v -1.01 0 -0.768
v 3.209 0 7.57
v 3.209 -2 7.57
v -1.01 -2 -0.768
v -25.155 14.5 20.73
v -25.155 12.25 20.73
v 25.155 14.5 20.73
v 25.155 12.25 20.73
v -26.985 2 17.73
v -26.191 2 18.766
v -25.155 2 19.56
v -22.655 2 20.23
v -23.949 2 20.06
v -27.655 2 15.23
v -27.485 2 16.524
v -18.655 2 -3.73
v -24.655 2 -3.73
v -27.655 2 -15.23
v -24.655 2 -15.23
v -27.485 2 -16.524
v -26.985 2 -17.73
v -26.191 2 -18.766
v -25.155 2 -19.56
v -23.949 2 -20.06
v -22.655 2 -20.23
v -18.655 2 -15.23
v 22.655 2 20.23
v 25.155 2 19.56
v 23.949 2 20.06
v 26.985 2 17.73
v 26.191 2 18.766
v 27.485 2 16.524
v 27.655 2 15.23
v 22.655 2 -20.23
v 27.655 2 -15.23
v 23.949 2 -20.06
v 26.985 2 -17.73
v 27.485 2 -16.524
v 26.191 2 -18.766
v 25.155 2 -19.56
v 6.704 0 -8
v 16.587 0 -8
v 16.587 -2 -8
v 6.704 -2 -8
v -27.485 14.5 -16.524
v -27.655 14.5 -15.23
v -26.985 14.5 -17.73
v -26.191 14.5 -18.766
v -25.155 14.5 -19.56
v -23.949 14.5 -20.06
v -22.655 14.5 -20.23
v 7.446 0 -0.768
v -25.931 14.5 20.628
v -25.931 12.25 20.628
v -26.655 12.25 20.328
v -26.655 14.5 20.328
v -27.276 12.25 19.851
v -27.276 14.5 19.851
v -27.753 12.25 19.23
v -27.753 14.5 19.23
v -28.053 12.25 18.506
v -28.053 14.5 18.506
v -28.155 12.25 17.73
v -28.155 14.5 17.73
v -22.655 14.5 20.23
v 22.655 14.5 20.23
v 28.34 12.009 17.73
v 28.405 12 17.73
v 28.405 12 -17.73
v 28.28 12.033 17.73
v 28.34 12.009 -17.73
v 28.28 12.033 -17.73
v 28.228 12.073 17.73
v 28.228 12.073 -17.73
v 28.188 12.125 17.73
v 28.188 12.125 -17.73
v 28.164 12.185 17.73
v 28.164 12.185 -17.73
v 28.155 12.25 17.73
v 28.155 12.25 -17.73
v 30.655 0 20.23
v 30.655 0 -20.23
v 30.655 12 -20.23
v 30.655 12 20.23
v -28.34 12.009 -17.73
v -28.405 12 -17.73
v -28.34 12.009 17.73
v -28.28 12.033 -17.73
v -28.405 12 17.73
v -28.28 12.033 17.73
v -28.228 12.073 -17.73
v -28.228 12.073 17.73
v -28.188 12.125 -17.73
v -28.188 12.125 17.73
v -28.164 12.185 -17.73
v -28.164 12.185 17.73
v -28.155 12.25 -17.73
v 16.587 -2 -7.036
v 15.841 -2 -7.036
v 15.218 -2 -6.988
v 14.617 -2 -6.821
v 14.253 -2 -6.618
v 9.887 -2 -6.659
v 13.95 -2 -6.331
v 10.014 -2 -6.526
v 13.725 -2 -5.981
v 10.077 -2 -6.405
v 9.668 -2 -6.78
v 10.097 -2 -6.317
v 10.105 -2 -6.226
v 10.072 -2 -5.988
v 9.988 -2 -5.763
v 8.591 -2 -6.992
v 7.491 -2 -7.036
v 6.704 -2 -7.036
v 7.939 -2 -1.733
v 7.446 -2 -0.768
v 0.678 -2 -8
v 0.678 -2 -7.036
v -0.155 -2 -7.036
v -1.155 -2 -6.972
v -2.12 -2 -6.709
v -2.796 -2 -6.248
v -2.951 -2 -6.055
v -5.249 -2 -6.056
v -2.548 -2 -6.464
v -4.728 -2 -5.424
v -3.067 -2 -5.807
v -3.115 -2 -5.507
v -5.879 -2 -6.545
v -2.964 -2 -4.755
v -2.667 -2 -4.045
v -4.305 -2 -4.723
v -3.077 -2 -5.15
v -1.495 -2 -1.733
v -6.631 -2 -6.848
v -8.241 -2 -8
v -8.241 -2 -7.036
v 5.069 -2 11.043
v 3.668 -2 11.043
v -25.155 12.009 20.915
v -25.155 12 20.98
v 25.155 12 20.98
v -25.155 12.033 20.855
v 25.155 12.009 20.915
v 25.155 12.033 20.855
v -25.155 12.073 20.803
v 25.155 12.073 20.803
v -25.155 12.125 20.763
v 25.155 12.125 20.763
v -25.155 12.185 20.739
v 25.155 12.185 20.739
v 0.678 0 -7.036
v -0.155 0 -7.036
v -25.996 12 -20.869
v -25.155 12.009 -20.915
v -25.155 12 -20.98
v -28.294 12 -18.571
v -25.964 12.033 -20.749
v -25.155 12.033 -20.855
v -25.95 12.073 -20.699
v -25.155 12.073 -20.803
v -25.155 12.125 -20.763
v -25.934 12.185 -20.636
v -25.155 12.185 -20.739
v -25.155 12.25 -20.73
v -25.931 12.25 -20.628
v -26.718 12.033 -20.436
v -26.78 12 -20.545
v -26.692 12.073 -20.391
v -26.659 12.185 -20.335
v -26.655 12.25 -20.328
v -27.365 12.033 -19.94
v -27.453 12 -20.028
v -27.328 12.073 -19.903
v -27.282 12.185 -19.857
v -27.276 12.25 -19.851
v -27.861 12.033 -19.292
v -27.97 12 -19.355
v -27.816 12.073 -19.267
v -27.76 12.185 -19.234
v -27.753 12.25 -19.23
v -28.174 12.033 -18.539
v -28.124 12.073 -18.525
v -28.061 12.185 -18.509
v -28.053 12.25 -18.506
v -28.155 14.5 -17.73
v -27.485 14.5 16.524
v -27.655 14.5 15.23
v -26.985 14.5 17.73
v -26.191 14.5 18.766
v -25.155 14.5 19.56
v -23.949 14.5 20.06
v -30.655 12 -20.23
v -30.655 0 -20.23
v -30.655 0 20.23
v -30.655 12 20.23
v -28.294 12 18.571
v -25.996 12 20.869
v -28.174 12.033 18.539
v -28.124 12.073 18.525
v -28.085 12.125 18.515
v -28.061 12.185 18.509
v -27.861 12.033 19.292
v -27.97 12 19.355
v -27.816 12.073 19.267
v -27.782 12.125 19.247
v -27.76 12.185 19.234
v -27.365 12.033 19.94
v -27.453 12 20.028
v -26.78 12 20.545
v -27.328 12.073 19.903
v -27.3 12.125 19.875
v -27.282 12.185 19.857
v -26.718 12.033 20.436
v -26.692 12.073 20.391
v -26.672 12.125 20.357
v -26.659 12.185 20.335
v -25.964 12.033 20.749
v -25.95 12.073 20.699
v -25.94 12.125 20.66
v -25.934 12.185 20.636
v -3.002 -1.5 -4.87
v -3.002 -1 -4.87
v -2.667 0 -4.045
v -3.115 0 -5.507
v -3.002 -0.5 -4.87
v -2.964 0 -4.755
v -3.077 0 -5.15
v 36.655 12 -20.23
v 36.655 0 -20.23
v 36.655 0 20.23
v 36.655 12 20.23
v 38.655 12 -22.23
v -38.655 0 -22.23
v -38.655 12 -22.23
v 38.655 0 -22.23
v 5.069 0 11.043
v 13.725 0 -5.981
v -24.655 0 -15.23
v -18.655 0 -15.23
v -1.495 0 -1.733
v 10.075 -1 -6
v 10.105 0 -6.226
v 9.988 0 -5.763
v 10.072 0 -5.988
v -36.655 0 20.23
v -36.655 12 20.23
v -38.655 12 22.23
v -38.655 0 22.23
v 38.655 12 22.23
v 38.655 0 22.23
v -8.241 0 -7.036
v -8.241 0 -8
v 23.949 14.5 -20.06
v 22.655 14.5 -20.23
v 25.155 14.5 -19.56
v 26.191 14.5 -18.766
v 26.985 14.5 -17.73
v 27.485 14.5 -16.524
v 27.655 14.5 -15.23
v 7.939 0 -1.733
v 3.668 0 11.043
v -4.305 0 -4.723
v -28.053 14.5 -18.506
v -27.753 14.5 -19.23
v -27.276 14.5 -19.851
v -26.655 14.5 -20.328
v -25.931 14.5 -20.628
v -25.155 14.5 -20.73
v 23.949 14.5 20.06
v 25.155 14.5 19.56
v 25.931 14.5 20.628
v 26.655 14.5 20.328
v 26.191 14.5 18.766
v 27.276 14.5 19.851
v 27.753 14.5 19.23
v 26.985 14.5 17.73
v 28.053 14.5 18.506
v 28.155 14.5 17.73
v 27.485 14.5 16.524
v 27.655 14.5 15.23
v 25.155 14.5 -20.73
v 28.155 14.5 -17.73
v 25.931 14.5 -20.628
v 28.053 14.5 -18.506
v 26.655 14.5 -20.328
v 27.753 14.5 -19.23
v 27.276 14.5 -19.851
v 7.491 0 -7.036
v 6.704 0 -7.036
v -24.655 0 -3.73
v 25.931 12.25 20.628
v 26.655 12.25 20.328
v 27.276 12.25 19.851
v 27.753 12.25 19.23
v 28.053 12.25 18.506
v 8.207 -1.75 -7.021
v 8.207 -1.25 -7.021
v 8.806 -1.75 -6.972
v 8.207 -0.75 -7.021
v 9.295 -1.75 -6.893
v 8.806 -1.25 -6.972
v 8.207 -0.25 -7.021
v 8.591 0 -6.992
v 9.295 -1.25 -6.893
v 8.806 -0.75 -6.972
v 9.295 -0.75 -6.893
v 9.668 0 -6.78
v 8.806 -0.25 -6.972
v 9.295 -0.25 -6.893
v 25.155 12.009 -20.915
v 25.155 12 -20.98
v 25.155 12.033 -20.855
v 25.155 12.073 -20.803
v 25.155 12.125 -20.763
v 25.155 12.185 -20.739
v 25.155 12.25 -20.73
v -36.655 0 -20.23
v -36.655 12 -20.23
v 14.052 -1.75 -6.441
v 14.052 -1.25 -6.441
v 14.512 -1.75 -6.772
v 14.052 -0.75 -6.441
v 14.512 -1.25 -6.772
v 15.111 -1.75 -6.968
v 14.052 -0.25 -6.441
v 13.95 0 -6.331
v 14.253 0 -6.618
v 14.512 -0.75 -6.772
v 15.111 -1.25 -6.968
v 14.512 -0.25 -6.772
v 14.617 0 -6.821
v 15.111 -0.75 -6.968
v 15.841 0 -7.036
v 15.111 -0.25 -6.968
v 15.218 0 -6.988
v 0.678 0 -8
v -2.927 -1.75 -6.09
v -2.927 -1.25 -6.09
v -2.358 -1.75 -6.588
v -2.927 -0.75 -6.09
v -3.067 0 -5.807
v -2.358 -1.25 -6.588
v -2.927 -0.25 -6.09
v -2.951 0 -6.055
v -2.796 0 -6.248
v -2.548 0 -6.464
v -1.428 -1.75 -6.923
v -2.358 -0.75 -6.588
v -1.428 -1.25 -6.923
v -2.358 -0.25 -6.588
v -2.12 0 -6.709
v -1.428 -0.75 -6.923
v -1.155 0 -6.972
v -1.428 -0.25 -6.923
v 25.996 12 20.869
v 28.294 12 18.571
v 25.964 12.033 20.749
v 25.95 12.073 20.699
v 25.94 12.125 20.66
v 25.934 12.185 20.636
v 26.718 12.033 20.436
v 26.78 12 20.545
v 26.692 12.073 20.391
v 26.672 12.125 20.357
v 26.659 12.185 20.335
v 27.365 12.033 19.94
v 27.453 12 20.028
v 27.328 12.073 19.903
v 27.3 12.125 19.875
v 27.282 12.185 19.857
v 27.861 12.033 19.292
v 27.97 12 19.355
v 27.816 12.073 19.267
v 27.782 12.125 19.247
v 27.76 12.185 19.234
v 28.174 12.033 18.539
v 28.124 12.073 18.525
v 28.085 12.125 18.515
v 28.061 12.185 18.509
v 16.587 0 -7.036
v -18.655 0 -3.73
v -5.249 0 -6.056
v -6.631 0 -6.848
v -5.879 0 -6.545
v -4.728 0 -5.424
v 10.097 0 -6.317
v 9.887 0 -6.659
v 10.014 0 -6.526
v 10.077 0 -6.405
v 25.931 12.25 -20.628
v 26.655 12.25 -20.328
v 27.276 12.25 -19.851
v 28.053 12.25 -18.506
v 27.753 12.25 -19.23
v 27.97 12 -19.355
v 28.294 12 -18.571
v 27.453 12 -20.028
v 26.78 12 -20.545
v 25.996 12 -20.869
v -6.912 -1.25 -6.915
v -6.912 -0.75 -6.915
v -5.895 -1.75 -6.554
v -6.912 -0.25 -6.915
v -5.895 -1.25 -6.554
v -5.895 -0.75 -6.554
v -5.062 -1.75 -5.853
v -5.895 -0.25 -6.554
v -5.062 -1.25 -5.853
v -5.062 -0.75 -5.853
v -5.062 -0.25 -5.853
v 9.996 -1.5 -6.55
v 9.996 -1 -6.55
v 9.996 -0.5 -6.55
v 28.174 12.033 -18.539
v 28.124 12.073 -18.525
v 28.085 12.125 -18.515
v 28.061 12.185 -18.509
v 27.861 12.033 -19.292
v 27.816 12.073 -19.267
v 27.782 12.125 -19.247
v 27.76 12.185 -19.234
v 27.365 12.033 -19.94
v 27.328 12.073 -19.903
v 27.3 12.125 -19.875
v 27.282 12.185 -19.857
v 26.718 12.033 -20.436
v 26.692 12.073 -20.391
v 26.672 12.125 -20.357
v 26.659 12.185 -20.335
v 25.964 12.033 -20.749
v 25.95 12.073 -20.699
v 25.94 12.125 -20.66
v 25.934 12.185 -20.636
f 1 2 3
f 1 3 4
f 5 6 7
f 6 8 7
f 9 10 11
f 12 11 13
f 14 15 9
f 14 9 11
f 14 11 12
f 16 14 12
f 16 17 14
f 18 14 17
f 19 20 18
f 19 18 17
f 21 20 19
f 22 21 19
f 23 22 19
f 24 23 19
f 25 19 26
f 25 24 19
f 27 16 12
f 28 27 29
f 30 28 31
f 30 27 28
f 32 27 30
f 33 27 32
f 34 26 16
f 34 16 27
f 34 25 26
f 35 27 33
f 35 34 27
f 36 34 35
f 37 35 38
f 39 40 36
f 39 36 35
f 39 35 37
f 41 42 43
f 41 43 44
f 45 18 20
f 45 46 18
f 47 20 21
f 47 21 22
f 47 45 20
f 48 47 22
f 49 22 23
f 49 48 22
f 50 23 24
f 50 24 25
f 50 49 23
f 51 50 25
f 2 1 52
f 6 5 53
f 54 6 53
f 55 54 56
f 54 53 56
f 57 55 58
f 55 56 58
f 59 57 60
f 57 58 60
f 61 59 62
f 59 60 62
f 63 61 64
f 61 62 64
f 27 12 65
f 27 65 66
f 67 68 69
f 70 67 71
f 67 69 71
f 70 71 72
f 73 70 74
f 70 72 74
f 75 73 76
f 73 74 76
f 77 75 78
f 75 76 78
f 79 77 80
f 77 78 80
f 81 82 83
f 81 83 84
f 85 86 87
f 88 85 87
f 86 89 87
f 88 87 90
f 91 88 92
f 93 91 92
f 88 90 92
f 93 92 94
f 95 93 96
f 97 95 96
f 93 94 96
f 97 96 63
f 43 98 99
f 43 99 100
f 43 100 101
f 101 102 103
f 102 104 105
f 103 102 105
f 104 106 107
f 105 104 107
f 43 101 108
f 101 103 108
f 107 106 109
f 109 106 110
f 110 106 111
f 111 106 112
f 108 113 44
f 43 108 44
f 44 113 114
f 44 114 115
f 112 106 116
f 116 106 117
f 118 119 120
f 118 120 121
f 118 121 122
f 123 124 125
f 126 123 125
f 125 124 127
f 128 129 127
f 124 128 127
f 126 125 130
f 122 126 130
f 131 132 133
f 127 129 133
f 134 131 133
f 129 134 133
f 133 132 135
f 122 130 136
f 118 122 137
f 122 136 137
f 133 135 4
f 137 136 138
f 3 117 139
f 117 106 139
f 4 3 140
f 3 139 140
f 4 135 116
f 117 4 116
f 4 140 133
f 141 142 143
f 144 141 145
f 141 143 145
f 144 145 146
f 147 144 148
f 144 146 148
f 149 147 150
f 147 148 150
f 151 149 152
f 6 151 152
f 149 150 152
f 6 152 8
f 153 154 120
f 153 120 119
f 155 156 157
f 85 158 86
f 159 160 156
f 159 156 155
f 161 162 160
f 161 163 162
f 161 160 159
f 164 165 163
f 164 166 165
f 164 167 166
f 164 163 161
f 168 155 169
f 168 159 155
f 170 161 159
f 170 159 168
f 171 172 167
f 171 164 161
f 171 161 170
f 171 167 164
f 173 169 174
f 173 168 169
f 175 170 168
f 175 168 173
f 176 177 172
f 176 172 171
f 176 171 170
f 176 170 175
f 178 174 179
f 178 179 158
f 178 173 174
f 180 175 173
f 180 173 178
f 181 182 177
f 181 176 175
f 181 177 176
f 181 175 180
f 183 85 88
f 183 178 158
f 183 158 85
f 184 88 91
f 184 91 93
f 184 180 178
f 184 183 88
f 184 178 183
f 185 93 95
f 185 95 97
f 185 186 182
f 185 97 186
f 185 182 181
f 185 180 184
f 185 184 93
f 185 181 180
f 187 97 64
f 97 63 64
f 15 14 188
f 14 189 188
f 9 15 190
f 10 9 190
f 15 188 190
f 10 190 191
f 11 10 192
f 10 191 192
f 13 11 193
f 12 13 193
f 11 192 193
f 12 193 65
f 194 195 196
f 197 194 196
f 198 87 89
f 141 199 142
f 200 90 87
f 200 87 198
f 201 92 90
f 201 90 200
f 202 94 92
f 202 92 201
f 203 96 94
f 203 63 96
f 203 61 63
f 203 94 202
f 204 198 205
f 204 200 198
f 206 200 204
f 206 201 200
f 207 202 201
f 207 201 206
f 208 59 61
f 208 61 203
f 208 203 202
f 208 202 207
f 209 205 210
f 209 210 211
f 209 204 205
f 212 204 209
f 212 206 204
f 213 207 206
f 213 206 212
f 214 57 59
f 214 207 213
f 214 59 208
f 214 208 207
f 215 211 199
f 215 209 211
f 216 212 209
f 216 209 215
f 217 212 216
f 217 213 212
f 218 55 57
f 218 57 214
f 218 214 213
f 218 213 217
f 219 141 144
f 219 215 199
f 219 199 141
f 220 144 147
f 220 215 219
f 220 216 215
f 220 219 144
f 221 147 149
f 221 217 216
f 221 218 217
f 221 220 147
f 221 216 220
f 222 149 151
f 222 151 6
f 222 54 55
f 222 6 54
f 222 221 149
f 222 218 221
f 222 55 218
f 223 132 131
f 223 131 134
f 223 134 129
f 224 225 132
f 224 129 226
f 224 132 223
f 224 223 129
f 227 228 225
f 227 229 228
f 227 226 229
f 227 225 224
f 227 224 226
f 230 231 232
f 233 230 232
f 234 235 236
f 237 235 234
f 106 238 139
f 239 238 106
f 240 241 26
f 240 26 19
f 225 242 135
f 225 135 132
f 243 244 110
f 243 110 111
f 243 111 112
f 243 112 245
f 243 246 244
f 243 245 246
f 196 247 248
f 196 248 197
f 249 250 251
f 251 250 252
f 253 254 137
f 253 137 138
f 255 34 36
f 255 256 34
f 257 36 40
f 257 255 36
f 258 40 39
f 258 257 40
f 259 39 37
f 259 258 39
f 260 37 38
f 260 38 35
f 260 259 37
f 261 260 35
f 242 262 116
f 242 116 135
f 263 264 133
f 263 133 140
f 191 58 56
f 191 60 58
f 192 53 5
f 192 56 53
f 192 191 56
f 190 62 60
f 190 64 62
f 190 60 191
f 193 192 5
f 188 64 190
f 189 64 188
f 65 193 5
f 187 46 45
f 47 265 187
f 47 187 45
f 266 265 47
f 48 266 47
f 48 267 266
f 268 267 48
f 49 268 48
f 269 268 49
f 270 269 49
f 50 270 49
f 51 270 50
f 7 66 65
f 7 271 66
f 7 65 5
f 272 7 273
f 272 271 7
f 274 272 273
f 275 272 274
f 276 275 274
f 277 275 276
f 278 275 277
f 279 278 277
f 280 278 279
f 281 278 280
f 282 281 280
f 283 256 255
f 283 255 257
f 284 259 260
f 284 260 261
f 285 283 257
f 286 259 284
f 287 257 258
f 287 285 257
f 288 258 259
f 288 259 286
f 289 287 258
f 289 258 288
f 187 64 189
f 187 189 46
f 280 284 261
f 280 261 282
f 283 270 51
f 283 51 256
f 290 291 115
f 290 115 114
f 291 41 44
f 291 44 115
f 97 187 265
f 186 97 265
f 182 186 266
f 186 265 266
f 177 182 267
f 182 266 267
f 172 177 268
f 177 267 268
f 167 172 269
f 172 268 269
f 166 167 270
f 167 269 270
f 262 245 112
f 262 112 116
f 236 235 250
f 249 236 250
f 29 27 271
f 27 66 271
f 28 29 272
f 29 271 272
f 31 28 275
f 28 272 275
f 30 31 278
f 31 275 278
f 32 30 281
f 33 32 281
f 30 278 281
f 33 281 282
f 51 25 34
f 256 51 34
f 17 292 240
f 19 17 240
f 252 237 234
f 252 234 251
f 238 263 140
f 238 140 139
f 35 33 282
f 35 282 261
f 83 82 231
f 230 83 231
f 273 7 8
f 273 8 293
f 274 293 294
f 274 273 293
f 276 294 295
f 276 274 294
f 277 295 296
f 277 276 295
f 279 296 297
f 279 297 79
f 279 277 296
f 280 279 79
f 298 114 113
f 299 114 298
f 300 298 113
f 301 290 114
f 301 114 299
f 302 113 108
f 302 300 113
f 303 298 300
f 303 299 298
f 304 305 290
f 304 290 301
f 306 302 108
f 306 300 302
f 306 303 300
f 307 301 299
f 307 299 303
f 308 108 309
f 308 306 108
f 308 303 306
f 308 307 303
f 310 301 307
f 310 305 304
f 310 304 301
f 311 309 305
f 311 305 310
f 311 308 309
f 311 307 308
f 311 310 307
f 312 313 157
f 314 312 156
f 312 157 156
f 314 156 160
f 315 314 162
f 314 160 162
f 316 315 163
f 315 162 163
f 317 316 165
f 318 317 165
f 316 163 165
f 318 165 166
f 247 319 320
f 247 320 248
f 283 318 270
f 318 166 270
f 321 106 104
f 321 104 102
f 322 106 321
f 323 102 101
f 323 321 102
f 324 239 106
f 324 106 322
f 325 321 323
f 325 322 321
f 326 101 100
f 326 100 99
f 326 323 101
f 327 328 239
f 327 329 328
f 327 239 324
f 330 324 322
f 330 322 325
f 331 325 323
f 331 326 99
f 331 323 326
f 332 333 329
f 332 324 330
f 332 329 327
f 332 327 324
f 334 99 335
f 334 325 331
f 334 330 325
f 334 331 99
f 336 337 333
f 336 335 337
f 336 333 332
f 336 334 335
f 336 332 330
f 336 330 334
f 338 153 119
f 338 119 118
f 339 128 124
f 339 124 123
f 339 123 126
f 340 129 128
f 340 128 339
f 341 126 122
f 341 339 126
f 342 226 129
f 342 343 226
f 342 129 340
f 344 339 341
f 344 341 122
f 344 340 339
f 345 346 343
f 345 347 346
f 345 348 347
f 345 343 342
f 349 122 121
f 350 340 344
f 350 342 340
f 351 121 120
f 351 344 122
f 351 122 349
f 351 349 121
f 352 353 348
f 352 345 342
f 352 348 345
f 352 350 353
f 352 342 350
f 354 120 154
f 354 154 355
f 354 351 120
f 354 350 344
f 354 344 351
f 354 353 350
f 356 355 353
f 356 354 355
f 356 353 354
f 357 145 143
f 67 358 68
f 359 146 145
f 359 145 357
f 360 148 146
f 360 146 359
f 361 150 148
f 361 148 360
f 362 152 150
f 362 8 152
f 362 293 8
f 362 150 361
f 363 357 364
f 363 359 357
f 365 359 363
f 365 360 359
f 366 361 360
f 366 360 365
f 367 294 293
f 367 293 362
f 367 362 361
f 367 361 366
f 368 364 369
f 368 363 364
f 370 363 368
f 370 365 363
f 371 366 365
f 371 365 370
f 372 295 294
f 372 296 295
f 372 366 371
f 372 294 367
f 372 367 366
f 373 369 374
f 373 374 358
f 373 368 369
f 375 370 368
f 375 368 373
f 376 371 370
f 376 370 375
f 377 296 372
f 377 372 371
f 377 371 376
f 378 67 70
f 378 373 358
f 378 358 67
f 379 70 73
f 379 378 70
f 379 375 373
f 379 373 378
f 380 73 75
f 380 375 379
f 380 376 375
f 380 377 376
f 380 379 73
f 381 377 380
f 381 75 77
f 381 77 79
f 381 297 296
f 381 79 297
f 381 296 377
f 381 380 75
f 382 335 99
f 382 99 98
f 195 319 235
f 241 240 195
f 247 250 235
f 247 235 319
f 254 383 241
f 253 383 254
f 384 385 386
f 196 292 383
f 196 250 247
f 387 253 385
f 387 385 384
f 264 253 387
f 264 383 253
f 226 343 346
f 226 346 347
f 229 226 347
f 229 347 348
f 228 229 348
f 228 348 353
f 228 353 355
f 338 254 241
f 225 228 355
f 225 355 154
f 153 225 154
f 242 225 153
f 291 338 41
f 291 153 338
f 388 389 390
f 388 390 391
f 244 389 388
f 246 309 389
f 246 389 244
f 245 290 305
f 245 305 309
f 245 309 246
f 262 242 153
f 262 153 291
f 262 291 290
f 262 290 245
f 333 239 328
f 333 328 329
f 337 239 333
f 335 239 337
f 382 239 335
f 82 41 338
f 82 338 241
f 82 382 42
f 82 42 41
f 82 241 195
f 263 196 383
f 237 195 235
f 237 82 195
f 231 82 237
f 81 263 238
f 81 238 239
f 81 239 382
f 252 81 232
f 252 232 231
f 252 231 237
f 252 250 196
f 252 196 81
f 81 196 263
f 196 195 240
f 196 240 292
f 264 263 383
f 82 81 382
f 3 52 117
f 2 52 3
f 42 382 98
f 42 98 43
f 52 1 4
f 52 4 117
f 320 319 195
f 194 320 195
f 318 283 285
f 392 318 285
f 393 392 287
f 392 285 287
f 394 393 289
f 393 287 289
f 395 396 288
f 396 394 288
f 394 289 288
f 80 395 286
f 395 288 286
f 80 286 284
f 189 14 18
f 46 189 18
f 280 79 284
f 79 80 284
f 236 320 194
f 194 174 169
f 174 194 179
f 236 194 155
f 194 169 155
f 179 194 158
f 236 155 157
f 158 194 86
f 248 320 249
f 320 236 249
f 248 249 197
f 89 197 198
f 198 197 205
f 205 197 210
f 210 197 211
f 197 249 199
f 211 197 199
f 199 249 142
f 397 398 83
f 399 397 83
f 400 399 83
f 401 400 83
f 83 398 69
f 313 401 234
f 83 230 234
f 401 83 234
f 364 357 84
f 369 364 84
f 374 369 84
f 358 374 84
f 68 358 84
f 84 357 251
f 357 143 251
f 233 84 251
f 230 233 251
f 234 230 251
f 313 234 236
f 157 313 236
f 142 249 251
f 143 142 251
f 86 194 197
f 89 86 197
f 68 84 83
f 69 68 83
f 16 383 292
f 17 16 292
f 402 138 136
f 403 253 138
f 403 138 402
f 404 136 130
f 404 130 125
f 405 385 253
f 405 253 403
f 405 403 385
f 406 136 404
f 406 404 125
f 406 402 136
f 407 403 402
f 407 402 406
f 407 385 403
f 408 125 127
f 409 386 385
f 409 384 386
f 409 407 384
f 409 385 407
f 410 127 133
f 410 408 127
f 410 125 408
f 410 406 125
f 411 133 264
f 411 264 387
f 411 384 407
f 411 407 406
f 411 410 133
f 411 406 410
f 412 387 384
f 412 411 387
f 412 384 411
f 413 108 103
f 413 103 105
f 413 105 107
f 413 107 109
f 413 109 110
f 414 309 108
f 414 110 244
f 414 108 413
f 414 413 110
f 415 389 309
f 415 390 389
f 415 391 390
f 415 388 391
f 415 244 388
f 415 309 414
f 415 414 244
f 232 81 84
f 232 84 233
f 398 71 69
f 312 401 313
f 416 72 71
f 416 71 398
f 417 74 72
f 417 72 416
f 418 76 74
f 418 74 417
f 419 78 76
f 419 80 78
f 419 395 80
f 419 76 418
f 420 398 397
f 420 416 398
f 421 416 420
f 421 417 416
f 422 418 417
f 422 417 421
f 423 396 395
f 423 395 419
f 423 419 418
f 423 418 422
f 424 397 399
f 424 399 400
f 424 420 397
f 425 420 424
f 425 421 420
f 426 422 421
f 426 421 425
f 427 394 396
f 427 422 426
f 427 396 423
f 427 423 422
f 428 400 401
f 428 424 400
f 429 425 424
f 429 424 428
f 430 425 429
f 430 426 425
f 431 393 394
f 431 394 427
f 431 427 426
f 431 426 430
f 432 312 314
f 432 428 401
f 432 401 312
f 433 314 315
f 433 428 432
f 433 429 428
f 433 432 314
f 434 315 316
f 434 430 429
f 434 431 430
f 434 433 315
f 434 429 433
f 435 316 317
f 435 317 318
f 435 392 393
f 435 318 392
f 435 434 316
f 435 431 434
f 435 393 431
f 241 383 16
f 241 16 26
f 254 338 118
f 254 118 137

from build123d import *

# Parameters (mm, degrees)
SKETCH1_W           = 59.31
SKETCH1_H           = 44.46
BOSS_EXTRUDE1_DEPTH = 2
SKETCH2_W           = 59.31
SKETCH2_H           = 44.46
SKETCH2_W_2         = 55.31
SKETCH2_H_2         = 40.46
BOSS_EXTRUDE2_DEPTH = 12.5
SKETCH3_W           = 1.5
SKETCH3_H           = 2.5
SKETCH5_W           = 6
SKETCH5_H           = 11.5
CUT_EXTRUDE1_DEPTH  = 10
BOSS_EXTRUDE3_DEPTH = 2
FILLET1_R           = 5
SKETCH7_W           = 10
SKETCH7_H           = 44.46
SKETCH7_W_2         = 6
SKETCH7_H_2         = 40.46
BOSS_EXTRUDE4_DEPTH = 12
FILLET2_R           = 3
FILLET3_R           = 0.25


with BuildPart() as part:
    # Sketch1 → Boss-Extrude1 (new body)
    with BuildSketch(Plane(origin=(0, 0, 0), x_dir=(1, 0, 0), z_dir=(0, 1, 0))):
        Rectangle(SKETCH1_W, SKETCH1_H)
    extrude(amount=BOSS_EXTRUDE1_DEPTH)

    # Sketch2 → Boss-Extrude2 (add)
    with BuildSketch(Plane(origin=(0, 2, 0), x_dir=(1, 0, 0), z_dir=(0, 1, 0))):
        Rectangle(SKETCH2_W, SKETCH2_H)
        Rectangle(SKETCH2_W_2, SKETCH2_H_2, mode=Mode.SUBTRACT)
    extrude(amount=BOSS_EXTRUDE2_DEPTH)

    # Cut-Sweep1: sweep along a path in Sketch4
    with BuildLine(Plane(origin=(0, 14.5, 0), x_dir=(1, 0, 0), z_dir=(0, 1, 0))) as cut_sweep1_path:
        Line((-29.655, -22.23), (29.655, -22.23))
        Line((29.655, -22.23), (29.655, 22.23))
        Line((29.655, 22.23), (-29.655, 22.23))
        Line((-29.655, 22.23), (-29.655, -22.23))
    # Sketch3 → Cut-Sweep1 (sweep, cut)
    with BuildSketch(Plane(origin=(29.655, 0, 0), x_dir=(0, 0, -1), z_dir=(1, 0, 0))):
        with Locations((-21.48, 13.25)):
            Rectangle(SKETCH3_W, SKETCH3_H)
    sweep(path=cut_sweep1_path.line, transition=Transition.RIGHT, mode=Mode.SUBTRACT)

    # Sketch5 → Cut-Extrude1 (cut)
    with BuildSketch(Plane(origin=(0, 0, 0), x_dir=(-1, 0, 0), z_dir=(0, -1, 0))):
        with Locations((21.655, 9.48)):
            Rectangle(SKETCH5_W, SKETCH5_H)
    extrude(amount=-CUT_EXTRUDE1_DEPTH, mode=Mode.SUBTRACT)

    # Sketch6 → Boss-Extrude3 (add)
    with BuildSketch(Plane.XZ):
        with BuildLine():
            Line((3.668359532, 11.043003806), (5.069466615, 11.043003806))
            Line((5.069466615, 11.043003806), (13.724692633, -5.981200546))
            add(Edge.make_bspline(
                [(13.724692633, -5.981200546), (13.770465415, -6.066255609), (13.860276332, -6.233142412), (14.049596398, -6.44471403), (14.259282132, -6.635498751), (14.514562764, -6.779774023), (14.797989941, -6.899882103), (15.118123905, -6.972877212), (15.467702486, -7.031048399), (15.713066528, -7.034166281), (15.841418927, -7.035797276)],
                knots=[0, 0, 0, 0, 0.923122777, 1.811262043, 2.707284477, 3.630407254, 4.607627564, 5.650245945, 6.770820012, 8, 8, 8, 8], degree=3))
            Line((15.841418927, -7.035797276), (16.587169471, -7.035797276))
            Line((16.587169471, -7.035797276), (16.587169471, -8))
            Line((16.587169471, -8), (6.704091546, -8))
            Line((6.704091546, -8), (6.704091546, -7.035797276))
            Line((6.704091546, -7.035797276), (7.491272677, -7.035797276))
            add(Edge.make_bspline(
                [(7.491272677, -7.035797276), (7.615561715, -7.034972065), (7.854152468, -7.033387954), (8.197254943, -7.024270941), (8.510837169, -6.998643255), (8.797935797, -6.976226749), (9.056099226, -6.935998597), (9.287242582, -6.897915489), (9.488634661, -6.845109649), (9.610791127, -6.800614432), (9.66826164, -6.779680927)],
                knots=[0, 0, 0, 0, 1.354335262, 2.59984206, 3.738199698, 4.78223889, 5.735982514, 6.583888141, 7.33376694, 8, 8, 8, 8], degree=3))
            add(Edge.make_bspline(
                [(9.66826164, -6.779680927), (9.734616654, -6.749406693), (9.857910933, -6.693154125), (9.99935023, -6.559441952), (10.092017823, -6.401790611), (10.10075551, -6.2849798), (10.105166, -6.226017644)],
                knots=[0, 0, 0, 0, 1.157571245, 2.15088362, 3.06662844, 4, 4, 4, 4], degree=3))
            add(Edge.make_bspline(
                [(10.105166, -6.226017644), (10.098921578, -6.149754311), (10.08575846, -5.988992716), (10.021947105, -5.840695302), (9.988407076, -5.762748366)],
                knots=[0, 0, 0, 0, 0.948775522, 2, 2, 2, 2], degree=3))
            Line((9.988407076, -5.762748366), (7.939476287, -1.732682292))
            Line((7.939476287, -1.732682292), (-1.495398027, -1.732682292))
            Line((-1.495398027, -1.732682292), (-2.666753681, -4.045262263))
            add(Edge.make_bspline(
                [(-2.666753681, -4.045262263), (-2.73463111, -4.18986222), (-2.860946743, -4.458953658), (-2.99975414, -4.849828516), (-3.097335174, -5.191789881), (-3.109447861, -5.40819885), (-3.114957291, -5.506632017)],
                knots=[0, 0, 0, 0, 1.244034282, 2.315069679, 3.233612959, 4, 4, 4, 4], degree=3))
            add(Edge.make_bspline(
                [(-3.114957291, -5.506632017), (-3.105178856, -5.610008506), (-3.085538794, -5.817640973), (-2.930679332, -6.11109022), (-2.683549261, -6.372065908), (-2.348052402, -6.608977598), (-1.921244388, -6.804306269), (-1.406472367, -6.937233956), (-0.80918362, -7.025851211), (-0.382171294, -7.032338986), (-0.154553614, -7.035797276)],
                knots=[0, 0, 0, 0, 0.676796425, 1.359350793, 2.130179084, 3.02304161, 4.041766613, 5.196580708, 6.505645488, 8, 8, 8, 8], degree=3))
            Line((-0.154553614, -7.035797276), (0.677824519, -7.035797276))
            Line((0.677824519, -7.035797276), (0.677824519, -8))
            Line((0.677824519, -8), (-8.241050681, -8))
            Line((-8.241050681, -8), (-8.241050681, -7.035797276))
            add(Edge.make_bspline(
                [(-8.241050681, -7.035797276), (-8.00595871, -7.030682959), (-7.560198321, -7.020985648), (-6.930404722, -6.931476506), (-6.376944833, -6.783238723), (-5.886269273, -6.568068877), (-5.442332689, -6.26093688), (-5.039212162, -5.844454164), (-4.645254972, -5.330344026), (-4.423041234, -4.933672593), (-4.305145029, -4.723217304)],
                knots=[0, 0, 0, 0, 1.157126977, 2.194040787, 3.123941644, 3.970721164, 4.81957436, 5.763811563, 6.813583119, 8, 8, 8, 8], degree=3))
            Line((-4.305145029, -4.723217304), (3.668359532, 11.043003806))
        make_face()
        Polygon((3.208856671, 7.570367432), (-1.009530248, -0.768479567), (7.446075674, -0.768479567), align=None, mode=Mode.SUBTRACT)
    extrude(amount=BOSS_EXTRUDE3_DEPTH)

    # Fillet1
    fillet1_edges = [part.edges().sort_by_distance(p)[0] for p in [
        (27.655, 8.25, 20.23),
        (27.655, 8.25, -20.23),
        (-27.655, 8.25, -20.23),
        (-27.655, 8.25, 20.23),
    ]]
    fillet(fillet1_edges, radius=FILLET1_R)

    # Sketch7 → Boss-Extrude4 (add)
    # profile 1 of 2: a face of its own
    with BuildSketch(Plane.XZ):
        with Locations((-33.655, 0)):
            Rectangle(SKETCH7_W, SKETCH7_H)
        with Locations((-33.655, 0)):
            Rectangle(SKETCH7_W_2, SKETCH7_H_2, mode=Mode.SUBTRACT)
    # profile 2 of 2: a face of its own
    with BuildSketch(Plane.XZ):
        with Locations((33.655, 0)):
            Rectangle(SKETCH7_W, SKETCH7_H)
        with Locations((33.655, 0)):
            Rectangle(SKETCH7_W_2, SKETCH7_H_2, mode=Mode.SUBTRACT)
    extrude(amount=-BOSS_EXTRUDE4_DEPTH)

    # Fillet2
    fillet2_edges = [part.edges().sort_by_distance(p)[0] for p in [
        (-28.155, 13.25, -20.73),
        (28.155, 13.25, -20.73),
        (28.155, 13.25, 20.73),
        (-28.155, 13.25, 20.73),
    ]]
    fillet(fillet2_edges, radius=FILLET2_R)

    # Fillet3
    fillet3_edges = [part.edges().sort_by_distance(p)[0] for p in [
        (-28.155, 12, 0),
        (0, 12, -20.73),
        (28.155, 12, 0),
        (0, 12, 20.73),
        (-27.276320344, 12, -19.851320344),
        (27.276320344, 12, -19.851320344),
        (27.276320344, 12, 19.851320344),
        (-27.276320344, 12, 19.851320344),
    ]]
    fillet(fillet3_edges, radius=FILLET3_R)


solid = part.part
